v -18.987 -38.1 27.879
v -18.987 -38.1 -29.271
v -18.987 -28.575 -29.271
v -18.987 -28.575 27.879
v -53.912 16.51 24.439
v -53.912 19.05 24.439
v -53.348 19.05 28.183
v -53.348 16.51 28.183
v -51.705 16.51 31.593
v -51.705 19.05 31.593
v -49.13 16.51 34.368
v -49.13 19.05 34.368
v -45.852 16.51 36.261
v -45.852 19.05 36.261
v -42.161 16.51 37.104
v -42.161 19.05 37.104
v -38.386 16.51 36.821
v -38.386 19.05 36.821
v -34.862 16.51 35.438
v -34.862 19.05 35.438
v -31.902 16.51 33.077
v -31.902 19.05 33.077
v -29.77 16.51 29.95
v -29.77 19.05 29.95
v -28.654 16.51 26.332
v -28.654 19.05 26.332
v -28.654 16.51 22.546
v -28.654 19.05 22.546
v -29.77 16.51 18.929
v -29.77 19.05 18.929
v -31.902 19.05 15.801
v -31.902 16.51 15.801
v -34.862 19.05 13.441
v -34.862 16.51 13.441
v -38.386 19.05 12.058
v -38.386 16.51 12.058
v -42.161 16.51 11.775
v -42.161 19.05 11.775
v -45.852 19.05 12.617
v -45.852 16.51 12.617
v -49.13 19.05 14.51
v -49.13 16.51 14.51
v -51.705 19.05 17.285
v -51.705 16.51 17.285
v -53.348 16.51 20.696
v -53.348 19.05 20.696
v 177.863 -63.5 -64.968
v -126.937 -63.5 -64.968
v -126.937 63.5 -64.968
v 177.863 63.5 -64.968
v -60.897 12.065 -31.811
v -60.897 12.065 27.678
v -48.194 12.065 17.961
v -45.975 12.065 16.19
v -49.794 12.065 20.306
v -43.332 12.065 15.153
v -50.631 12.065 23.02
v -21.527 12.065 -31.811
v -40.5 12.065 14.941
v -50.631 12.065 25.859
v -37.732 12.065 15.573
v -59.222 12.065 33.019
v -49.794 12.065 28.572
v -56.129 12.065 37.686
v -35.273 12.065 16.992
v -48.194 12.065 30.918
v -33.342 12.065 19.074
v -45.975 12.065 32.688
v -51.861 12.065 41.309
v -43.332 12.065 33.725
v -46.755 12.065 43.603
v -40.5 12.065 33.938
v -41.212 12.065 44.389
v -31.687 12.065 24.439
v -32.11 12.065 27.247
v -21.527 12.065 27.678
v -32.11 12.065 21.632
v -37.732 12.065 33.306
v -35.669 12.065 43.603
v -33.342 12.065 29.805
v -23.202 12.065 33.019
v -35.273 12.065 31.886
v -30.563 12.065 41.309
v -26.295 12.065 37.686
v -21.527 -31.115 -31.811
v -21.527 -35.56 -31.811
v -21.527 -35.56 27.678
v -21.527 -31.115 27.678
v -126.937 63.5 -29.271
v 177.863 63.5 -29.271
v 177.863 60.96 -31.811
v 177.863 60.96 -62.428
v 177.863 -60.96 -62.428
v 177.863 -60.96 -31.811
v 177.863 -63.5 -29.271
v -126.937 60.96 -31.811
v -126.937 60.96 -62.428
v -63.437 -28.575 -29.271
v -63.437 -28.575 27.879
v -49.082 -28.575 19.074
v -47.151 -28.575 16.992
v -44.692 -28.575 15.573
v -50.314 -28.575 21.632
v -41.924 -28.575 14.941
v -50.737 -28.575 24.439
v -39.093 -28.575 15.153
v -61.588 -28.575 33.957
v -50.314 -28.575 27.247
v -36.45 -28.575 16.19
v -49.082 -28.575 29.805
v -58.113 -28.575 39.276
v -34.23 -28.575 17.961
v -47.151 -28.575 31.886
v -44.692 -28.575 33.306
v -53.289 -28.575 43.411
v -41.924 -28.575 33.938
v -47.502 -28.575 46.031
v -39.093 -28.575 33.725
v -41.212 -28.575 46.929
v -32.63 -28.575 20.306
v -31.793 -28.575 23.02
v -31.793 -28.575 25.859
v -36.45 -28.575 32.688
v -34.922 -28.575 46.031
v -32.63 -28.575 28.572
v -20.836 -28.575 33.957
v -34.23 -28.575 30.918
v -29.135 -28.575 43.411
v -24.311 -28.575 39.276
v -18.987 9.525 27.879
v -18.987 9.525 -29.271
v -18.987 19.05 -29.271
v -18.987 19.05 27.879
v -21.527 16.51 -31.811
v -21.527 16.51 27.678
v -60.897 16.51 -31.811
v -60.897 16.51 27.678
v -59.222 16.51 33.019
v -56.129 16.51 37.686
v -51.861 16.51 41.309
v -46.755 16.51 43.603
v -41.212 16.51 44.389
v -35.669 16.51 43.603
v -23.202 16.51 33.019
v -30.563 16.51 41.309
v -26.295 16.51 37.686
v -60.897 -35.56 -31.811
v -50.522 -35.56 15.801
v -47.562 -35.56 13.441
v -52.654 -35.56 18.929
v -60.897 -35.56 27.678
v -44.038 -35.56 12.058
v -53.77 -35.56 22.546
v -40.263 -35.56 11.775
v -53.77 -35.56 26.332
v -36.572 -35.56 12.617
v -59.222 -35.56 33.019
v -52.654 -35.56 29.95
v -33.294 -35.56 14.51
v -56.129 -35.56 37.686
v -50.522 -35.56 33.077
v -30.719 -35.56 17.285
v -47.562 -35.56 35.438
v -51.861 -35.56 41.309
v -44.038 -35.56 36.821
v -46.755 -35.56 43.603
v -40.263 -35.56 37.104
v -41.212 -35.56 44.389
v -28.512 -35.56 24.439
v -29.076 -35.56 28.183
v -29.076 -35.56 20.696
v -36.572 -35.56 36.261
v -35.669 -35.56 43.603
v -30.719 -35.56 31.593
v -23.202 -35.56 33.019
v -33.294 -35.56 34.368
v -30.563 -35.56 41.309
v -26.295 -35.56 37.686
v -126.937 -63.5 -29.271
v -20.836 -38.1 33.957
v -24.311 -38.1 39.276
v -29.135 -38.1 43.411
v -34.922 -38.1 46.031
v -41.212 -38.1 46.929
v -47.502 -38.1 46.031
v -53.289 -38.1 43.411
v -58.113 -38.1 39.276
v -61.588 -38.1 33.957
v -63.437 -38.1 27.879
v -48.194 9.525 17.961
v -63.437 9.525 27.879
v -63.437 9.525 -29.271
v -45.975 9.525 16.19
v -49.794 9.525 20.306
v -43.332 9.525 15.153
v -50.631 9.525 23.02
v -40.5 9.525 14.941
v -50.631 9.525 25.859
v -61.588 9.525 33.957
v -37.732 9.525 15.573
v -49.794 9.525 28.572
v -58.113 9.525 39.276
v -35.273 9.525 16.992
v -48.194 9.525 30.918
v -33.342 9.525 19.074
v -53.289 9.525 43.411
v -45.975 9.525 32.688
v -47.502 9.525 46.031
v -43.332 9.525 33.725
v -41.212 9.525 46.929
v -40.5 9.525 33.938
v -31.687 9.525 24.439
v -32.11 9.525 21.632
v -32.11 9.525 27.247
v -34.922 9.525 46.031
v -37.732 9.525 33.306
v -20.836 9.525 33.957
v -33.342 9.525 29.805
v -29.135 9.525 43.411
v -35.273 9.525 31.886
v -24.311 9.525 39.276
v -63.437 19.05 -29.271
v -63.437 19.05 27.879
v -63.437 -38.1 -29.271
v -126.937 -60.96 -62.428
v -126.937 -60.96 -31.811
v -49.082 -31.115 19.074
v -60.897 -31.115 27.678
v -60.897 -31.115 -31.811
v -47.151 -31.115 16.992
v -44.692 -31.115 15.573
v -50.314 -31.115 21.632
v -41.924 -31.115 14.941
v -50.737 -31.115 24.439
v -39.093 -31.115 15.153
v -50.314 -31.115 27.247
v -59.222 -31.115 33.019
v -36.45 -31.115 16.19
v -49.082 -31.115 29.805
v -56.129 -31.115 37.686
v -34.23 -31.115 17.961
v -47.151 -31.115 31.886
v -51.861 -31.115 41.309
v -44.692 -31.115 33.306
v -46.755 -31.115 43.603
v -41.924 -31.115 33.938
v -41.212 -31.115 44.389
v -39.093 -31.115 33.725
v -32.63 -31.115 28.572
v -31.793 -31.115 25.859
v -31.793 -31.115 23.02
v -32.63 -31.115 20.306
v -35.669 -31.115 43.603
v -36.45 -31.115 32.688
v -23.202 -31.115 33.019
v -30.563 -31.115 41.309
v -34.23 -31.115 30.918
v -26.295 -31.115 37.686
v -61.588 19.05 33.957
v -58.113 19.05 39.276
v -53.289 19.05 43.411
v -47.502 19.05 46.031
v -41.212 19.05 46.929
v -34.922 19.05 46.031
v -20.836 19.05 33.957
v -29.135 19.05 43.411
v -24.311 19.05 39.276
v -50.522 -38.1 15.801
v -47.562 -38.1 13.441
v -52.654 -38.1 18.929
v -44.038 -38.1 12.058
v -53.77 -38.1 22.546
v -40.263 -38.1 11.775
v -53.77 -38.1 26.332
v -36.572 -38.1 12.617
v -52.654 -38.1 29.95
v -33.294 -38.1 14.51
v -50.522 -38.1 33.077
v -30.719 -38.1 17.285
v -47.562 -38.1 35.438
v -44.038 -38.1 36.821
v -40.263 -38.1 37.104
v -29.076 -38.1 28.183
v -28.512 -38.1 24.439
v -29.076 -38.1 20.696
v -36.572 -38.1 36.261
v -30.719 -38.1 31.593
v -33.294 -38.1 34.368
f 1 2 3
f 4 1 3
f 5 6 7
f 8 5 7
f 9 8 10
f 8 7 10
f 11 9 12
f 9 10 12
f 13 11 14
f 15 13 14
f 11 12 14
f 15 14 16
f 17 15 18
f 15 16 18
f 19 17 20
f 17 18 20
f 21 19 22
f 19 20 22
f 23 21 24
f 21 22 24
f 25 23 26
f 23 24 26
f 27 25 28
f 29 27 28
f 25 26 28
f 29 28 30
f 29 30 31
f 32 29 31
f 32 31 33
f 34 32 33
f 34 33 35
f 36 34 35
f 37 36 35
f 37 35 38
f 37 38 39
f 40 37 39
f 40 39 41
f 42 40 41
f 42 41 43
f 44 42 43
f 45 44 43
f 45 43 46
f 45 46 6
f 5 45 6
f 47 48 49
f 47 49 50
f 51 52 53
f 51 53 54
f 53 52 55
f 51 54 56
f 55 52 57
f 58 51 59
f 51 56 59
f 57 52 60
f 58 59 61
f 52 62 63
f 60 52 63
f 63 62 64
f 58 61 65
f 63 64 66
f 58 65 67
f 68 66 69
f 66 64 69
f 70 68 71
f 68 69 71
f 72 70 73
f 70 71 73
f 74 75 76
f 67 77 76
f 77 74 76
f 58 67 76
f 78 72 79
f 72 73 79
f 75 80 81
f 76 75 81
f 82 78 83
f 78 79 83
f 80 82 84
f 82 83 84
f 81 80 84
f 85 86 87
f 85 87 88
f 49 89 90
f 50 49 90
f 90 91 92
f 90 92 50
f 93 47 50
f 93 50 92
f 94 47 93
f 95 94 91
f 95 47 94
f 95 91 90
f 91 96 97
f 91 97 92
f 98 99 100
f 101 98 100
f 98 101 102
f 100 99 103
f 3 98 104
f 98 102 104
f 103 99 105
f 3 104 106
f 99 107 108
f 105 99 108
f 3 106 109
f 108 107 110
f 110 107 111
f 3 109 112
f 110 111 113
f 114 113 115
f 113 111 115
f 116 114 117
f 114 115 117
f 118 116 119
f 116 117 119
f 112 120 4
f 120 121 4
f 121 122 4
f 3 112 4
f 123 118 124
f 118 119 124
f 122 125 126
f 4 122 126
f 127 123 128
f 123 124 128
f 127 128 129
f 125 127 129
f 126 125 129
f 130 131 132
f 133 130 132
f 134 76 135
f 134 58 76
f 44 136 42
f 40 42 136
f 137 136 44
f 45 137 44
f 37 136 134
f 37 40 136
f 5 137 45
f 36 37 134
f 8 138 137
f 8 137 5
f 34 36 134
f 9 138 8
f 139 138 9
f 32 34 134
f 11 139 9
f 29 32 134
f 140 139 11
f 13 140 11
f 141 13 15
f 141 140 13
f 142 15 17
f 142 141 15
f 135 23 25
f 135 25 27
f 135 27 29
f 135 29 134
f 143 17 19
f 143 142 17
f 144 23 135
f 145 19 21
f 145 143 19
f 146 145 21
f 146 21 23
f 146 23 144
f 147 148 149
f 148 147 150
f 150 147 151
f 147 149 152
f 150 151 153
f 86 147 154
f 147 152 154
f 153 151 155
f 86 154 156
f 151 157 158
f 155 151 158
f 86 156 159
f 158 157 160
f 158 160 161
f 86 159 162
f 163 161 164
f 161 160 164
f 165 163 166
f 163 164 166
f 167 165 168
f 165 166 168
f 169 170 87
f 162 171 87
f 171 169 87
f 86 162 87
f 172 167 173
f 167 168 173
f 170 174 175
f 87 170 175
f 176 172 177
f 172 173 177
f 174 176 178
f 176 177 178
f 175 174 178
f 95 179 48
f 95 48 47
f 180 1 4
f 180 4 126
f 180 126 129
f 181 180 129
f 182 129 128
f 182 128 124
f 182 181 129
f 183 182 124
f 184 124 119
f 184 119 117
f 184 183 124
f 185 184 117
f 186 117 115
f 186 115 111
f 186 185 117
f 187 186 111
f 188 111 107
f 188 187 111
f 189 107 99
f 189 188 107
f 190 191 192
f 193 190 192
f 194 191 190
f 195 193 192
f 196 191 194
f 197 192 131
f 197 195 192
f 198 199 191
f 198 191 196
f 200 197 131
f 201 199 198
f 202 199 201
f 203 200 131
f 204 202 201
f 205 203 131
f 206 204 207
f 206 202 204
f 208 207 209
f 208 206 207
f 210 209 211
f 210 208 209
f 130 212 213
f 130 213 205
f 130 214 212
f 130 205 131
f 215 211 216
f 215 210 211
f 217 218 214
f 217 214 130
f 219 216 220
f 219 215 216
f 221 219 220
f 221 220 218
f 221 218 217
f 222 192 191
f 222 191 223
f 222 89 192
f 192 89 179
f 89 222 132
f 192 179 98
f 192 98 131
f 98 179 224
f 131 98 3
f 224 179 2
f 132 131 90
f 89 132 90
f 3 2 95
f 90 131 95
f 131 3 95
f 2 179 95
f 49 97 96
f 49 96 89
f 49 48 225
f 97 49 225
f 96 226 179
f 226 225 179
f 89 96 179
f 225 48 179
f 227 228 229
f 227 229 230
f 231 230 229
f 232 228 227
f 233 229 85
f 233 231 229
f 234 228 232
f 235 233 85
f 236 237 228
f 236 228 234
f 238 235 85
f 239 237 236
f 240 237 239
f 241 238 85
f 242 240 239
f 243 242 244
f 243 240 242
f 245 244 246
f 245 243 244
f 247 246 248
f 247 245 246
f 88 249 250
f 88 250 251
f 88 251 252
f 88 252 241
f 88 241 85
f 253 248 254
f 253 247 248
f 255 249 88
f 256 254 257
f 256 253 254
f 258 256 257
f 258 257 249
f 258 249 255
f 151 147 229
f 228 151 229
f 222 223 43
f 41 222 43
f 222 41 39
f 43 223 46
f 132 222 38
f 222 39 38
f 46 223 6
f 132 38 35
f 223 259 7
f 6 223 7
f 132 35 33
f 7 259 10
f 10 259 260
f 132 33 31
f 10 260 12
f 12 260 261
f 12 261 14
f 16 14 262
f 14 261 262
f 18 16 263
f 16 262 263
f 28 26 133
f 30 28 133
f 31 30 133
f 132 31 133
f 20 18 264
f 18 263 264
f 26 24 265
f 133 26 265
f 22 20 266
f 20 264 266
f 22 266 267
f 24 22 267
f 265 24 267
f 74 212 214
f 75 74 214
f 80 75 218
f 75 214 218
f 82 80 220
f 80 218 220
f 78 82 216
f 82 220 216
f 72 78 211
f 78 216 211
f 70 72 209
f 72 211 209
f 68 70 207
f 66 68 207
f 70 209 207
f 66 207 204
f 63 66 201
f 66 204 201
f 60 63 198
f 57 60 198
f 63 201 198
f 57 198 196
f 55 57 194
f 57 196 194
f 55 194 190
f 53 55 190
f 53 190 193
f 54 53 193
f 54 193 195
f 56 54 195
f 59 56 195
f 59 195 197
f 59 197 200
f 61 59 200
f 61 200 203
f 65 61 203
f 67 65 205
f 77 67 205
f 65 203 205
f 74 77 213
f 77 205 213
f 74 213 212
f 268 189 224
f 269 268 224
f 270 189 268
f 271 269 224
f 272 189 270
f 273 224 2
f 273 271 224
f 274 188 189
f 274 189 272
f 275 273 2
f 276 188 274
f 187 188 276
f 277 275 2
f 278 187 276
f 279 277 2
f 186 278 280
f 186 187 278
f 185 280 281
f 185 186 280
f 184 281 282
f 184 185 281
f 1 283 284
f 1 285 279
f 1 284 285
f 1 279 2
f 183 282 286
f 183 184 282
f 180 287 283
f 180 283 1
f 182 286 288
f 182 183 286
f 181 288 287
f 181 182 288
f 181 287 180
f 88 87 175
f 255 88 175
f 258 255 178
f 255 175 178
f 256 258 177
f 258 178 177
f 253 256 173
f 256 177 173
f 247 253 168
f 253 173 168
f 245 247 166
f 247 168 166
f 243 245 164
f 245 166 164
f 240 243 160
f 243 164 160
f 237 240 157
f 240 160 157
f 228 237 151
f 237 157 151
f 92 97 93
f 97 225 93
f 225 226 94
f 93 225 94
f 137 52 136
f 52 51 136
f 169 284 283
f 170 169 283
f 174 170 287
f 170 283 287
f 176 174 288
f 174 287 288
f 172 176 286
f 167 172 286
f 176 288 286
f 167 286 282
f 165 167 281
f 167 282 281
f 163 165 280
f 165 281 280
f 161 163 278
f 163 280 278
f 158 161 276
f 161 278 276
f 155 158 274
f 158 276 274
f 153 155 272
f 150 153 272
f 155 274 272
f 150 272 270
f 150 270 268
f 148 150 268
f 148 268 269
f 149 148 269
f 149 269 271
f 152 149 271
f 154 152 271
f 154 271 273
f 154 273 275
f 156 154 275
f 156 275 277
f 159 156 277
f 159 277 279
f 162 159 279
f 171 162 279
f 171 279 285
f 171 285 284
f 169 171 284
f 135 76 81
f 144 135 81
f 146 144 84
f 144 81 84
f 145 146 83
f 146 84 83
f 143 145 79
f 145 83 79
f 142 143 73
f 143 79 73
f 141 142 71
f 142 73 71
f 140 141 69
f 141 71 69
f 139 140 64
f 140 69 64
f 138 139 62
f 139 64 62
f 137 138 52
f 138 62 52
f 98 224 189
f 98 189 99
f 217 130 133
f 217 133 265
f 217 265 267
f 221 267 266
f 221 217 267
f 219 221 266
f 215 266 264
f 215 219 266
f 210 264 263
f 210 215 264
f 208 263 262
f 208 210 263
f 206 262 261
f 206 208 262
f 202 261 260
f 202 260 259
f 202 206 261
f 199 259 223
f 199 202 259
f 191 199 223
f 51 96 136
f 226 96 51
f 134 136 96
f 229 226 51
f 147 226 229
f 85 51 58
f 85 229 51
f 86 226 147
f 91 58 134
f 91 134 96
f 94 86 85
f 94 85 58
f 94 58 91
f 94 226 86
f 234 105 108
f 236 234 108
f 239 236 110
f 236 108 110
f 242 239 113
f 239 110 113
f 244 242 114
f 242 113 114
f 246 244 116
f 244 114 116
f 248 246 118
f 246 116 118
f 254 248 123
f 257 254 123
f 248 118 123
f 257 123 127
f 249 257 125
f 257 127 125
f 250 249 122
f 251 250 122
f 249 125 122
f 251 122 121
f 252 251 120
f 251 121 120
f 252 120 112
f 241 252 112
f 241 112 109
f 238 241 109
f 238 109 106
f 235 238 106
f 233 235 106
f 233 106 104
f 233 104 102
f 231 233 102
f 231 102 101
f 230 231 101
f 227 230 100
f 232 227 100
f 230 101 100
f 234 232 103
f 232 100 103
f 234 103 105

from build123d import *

# Parameters (mm, degrees)
F0_W            = 304.8
F0_H            = 35.6965847313
F1_DEPTH        = 63.5
F2_W            = 25.4
F2_H            = 44.45
F3_DEPTH        = 152.4
F4_W            = 44.45
F4_H            = 9.525
F5_DEPTH        = 57.15
F6_DEPTH        = 57.15
F9_DEPTH        = 9.525
F10_DEPTH       = 9.525
F11_W           = 304.8
F11_H           = 114.3
F12_DEPTH       = 31.75
F13_T           = -2.54
F16_D           = 19.05
F16_DEPTH       = 9.525
F16_CBORE_D     = 25.4
F16_CBORE_DEPTH = 3.81
F16_TIP         = 5.7231973962
F17_D           = 19.05
F17_DEPTH       = 9.525
F17_CBORE_D     = 25.4
F17_CBORE_DEPTH = 3.81
F17_TIP         = 5.7231973962


with BuildPart() as f1:
    # F0 (on Front) → F1 (new body, symmetric)
    with BuildSketch(Plane.XZ):
        with Locations((25.4629384518, -47.1194889396)):
            Rectangle(F0_W, F0_H)
    extrude(amount=F1_DEPTH, both=True)

    # F2 (on face) → F3 (cut)
    with BuildSketch(Plane.XZ.offset(63.5)):
        with BuildLine():
            ThreePointArc((-37.1512658894, 15.178803426), (-49.8512658894, 27.878803426), (-62.5512658894, 15.178803426))
            Line((-62.5512658894, 15.178803426), (-37.1512658894, 15.178803426))
        make_face()
        with Locations((-49.8512658894, -7.046196574)):
            Rectangle(F2_W, F2_H)
    extrude(amount=-F3_DEPTH, mode=Mode.SUBTRACT)

    # F4 (on face) → F5 (join)
    with BuildSketch(Plane.XY.offset(-29.271196574)):
        with Locations((-41.2120615482, 14.2875)):
            Rectangle(F4_W, F4_H)
    extrude(amount=F5_DEPTH)

    # F4 (on face) → F6 (join)
    with BuildSketch(Plane.XY.offset(-29.271196574)):
        with Locations((-41.2120615482, 14.2875)):
            Rectangle(F4_W, F4_H)
        with Locations((-41.2120615482, -33.3375)):
            Rectangle(F4_W, F4_H)
    extrude(amount=F6_DEPTH)

    # F7 (on face) → F9 (join)
    with BuildSketch(Plane.XZ.offset(38.1)):
        with BuildLine():
            Line((-63.4370615482, 27.878803426), (-18.9870615482, 27.878803426))
            ThreePointArc((-18.9870615482, 27.878803426), (-41.2120615482, 46.928803426), (-63.4370615482, 27.878803426))
        make_face()
    extrude(amount=-F9_DEPTH)

    # F8 (on face) → F10 (join)
    with BuildSketch(Plane.XZ.offset(-9.525)):
        with BuildLine():
            Line((-63.4370615482, 27.878803426), (-18.9870615482, 27.878803426))
            ThreePointArc((-18.9870615482, 27.878803426), (-41.2120615482, 46.928803426), (-63.4370615482, 27.878803426))
        make_face()
    extrude(amount=-F10_DEPTH)

    # F11 (on face) → F12 (join)
    with BuildSketch(Plane(origin=(0, 0, -64.9677813053), x_dir=(1, 0, 0), z_dir=(0, 0, -1))):
        with Locations((25.4629384518, 0.6365377843)):
            Rectangle(F11_W, F11_H)
    extrude(amount=-F12_DEPTH)

    # F13
    f13_openings = [f1.faces().sort_by_distance(p)[0] for p in [
        (-126.937062, 0, -47.119489),
        (177.862938, 0, -47.119489),
    ]]
    offset(amount=F13_T, openings=f13_openings, kind=Kind.INTERSECTION)

    # F16
    with Locations(Plane.XZ.offset(38.1)):
        with Locations((-41.2120615482, 24.4392200927)):
            CounterBoreHole(F16_D / 2, F16_CBORE_D / 2, F16_CBORE_DEPTH, depth=F16_DEPTH)
            with Locations((0, 0, -(F16_DEPTH + F16_TIP / 2))):  # 118° drill point
                Cone(0, F16_D / 2, F16_TIP, mode=Mode.SUBTRACT)

    # F17
    with Locations(Plane(origin=(0, 19.05, 0), x_dir=(-1, 0, 0), z_dir=(0, 1, 0))):
        with Locations((41.2120615482, 24.4392200927)):
            CounterBoreHole(F17_D / 2, F17_CBORE_D / 2, F17_CBORE_DEPTH, depth=F17_DEPTH)
            with Locations((0, 0, -(F17_DEPTH + F17_TIP / 2))):  # 118° drill point
                Cone(0, F17_D / 2, F17_TIP, mode=Mode.SUBTRACT)


solid = f1.part
